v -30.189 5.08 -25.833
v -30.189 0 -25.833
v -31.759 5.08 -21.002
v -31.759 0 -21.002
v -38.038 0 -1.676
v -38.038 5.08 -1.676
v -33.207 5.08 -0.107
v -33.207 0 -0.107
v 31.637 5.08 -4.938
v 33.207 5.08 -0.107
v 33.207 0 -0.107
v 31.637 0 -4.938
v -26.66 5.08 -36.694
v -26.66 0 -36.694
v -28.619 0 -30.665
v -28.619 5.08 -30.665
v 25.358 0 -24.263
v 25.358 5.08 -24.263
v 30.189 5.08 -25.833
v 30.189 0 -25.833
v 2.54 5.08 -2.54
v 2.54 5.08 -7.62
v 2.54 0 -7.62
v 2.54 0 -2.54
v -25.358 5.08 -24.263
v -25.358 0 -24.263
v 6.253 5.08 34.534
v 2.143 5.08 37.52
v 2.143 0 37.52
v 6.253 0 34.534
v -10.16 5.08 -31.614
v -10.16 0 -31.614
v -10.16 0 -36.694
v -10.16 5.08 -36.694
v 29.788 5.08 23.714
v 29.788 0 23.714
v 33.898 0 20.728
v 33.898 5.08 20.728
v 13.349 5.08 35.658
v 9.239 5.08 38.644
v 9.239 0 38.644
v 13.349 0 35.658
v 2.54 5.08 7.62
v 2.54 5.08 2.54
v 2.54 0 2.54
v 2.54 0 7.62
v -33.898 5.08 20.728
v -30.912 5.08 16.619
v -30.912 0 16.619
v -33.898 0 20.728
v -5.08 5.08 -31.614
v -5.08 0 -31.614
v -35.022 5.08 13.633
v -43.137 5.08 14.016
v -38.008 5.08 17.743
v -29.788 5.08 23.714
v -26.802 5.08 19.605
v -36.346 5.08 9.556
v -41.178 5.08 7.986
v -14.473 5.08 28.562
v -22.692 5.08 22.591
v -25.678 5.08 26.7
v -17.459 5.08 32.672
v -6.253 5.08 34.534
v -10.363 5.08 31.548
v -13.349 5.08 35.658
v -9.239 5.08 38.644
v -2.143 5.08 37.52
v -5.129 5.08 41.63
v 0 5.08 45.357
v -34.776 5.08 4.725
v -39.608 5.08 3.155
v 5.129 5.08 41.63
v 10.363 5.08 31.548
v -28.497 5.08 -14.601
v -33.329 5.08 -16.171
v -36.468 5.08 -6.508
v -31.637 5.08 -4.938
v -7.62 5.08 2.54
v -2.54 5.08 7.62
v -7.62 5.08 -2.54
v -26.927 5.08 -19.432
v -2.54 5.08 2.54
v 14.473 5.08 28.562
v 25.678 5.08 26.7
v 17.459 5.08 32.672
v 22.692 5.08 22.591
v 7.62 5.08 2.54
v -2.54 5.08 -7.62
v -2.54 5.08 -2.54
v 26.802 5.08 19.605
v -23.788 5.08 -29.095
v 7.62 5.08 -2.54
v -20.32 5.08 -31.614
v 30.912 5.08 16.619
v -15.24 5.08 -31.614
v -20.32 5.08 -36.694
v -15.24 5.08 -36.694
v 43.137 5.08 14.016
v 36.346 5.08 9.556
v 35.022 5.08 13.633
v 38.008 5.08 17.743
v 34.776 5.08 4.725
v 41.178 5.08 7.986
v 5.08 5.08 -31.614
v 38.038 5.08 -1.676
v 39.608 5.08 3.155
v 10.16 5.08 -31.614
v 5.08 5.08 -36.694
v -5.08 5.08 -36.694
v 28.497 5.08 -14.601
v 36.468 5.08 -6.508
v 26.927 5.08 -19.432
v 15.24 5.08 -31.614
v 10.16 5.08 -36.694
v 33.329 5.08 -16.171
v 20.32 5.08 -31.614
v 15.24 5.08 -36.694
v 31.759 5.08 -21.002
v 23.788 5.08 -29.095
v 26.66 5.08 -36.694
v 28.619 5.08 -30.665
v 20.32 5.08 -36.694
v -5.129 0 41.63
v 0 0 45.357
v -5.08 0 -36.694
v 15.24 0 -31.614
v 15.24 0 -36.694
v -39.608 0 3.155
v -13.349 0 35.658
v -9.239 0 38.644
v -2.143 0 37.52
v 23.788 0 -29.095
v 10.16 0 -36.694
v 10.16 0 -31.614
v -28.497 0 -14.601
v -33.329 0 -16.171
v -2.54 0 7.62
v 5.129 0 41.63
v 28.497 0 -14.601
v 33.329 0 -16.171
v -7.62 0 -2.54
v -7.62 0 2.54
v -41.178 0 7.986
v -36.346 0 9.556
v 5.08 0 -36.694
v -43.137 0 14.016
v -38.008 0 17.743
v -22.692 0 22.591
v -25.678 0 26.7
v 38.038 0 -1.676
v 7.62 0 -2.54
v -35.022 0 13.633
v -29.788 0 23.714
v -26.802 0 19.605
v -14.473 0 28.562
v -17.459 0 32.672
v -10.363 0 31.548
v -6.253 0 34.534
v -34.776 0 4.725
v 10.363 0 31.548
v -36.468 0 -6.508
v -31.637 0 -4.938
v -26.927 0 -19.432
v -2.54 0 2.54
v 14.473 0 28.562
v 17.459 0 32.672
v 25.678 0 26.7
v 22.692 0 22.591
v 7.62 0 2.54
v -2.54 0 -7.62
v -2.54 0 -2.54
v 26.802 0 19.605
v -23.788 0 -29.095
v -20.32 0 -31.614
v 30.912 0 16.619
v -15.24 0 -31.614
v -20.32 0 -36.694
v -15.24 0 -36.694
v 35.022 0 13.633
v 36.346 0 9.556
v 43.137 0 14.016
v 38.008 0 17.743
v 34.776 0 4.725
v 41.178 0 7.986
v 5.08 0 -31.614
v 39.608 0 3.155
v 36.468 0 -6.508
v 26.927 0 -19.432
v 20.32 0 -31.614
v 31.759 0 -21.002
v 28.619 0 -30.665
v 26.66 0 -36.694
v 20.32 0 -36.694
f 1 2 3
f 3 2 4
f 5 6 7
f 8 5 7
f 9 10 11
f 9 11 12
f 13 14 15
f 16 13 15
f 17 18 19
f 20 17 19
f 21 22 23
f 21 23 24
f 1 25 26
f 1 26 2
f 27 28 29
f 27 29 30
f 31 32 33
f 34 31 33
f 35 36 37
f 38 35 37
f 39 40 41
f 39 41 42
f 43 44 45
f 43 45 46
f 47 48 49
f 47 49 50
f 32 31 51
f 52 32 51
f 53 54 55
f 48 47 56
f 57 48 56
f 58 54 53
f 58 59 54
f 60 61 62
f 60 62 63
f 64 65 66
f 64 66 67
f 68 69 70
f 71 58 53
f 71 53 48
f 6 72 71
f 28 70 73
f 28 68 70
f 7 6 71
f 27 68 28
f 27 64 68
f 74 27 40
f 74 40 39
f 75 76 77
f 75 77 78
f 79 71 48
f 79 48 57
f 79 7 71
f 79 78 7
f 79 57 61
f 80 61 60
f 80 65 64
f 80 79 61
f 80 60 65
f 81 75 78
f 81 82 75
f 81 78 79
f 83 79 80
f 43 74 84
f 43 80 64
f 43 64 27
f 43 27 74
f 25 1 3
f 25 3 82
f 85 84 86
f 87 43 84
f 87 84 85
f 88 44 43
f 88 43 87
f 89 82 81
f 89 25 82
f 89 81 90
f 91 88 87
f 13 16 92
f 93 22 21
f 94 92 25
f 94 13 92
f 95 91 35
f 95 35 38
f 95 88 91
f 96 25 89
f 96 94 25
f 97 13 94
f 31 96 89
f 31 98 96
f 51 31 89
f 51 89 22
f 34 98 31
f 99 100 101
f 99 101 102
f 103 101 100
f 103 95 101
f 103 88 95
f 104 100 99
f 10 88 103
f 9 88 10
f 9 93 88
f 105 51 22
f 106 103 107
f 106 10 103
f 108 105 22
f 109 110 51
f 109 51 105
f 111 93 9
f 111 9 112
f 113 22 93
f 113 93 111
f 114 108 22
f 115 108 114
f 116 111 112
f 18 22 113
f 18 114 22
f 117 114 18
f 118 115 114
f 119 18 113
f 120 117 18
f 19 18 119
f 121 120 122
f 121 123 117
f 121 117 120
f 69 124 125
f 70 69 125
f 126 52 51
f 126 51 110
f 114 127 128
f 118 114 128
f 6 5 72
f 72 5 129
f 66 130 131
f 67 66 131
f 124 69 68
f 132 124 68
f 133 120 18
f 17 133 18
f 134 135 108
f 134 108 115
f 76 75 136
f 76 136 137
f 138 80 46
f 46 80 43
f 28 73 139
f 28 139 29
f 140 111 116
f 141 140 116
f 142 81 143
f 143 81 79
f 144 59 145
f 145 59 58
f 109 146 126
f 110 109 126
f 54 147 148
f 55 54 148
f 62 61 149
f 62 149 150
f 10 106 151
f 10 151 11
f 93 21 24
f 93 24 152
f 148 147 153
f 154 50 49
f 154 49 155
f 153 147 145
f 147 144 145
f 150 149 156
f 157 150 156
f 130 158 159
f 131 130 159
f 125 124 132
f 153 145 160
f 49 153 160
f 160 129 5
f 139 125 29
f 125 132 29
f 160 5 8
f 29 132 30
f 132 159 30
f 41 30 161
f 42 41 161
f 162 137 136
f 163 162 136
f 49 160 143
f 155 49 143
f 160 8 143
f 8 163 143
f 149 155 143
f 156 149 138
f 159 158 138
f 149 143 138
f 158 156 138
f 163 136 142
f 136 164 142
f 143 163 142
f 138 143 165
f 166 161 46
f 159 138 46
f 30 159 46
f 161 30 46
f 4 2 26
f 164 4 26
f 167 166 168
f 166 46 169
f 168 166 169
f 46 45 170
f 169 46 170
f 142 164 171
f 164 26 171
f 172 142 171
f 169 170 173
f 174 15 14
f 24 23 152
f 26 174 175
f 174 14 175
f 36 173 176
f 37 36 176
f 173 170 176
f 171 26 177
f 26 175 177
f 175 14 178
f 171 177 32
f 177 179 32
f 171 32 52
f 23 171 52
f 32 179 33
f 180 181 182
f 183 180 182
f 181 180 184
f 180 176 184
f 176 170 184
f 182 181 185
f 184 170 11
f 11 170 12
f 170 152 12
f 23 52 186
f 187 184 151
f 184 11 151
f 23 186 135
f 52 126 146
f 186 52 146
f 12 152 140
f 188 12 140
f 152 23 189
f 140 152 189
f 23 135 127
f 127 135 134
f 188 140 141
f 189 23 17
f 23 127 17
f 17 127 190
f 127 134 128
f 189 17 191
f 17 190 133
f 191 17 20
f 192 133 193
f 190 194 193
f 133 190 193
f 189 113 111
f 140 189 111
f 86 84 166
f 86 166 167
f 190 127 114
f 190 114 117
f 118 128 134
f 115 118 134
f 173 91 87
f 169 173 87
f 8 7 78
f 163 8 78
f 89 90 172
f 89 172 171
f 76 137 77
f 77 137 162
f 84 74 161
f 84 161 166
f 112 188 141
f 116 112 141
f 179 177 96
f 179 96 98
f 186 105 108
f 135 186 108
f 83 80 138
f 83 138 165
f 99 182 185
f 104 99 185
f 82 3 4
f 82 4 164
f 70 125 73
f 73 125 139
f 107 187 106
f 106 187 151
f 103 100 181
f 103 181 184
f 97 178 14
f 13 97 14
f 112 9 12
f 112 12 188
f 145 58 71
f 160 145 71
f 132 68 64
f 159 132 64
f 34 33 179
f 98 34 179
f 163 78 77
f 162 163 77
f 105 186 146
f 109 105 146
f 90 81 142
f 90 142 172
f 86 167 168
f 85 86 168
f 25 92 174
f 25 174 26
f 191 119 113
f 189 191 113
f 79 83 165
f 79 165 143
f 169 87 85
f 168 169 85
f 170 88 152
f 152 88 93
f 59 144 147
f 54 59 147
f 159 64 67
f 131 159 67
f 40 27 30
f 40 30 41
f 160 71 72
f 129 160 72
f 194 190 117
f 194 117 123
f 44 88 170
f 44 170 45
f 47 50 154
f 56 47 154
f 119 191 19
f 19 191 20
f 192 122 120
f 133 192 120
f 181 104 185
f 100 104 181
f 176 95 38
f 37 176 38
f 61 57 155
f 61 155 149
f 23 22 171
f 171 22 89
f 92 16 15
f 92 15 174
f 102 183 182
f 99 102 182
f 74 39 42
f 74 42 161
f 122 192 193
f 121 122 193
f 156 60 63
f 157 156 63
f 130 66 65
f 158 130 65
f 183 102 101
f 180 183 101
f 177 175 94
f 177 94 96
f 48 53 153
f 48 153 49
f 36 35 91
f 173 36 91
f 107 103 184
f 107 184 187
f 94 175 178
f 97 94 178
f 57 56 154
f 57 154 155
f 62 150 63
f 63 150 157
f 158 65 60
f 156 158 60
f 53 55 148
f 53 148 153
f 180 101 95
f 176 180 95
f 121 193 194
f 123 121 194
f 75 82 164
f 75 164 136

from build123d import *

# Parameters (mm, degrees)
BOSS_EXTRUDE1_DEPTH = 5.08
SKETCH2_W           = 5.08
SKETCH2_H           = 5.08
CUT_EXTRUDE1_DEPTH  = 5.08
CUT_EXTRUDE2_DEPTH  = 5.08


with BuildPart() as part:
    # Sketch1 → Boss-Extrude1 (new body)
    with BuildSketch(Plane(origin=(0, 0, 0), x_dir=(1, 0, 0), z_dir=(0, 1, 0))):
        Polygon((0, -45.356701101), (43.13678614, -14.015991449), (26.66, 36.694342), (-26.66, 36.694342), (-43.13678614, -14.015991449), align=None)
    extrude(amount=BOSS_EXTRUDE1_DEPTH)

    # Sketch2 → Cut-Extrude1 (cut)
    with BuildSketch(Plane(origin=(0, 5.08, 0), x_dir=(1, 0, 0), z_dir=(0, 1, 0))):
        with Locations((-17.78, 34.154342)):
            Rectangle(SKETCH2_W, SKETCH2_H)
        with Locations((7.62, 34.154342)):
            Rectangle(SKETCH2_W, SKETCH2_H)
        with Locations((17.78, 34.154342)):
            Rectangle(SKETCH2_W, SKETCH2_H)
        with Locations((-7.62, 34.154342)):
            Rectangle(SKETCH2_W, SKETCH2_H)
        Polygon((28.619167744, 30.664643686), (23.787800642, 29.094837355), (25.357606973, 24.263470252), (30.188974076, 25.833276584), align=None)
        Polygon((36.468199401, 6.507808173), (38.038005733, 1.67644107), (33.20663863, 0.106634738), (31.636832299, 4.938001841), align=None)
        Polygon((39.607812064, -3.154926033), (41.177618396, -7.986293136), (36.346251293, -9.556099467), (34.776444962, -4.724732364), align=None)
        Polygon((31.758780407, 21.001909481), (26.927413304, 19.432103149), (28.497219636, 14.600736047), (33.328586739, 16.170542378), align=None)
        Polygon((38.007618396, -17.742549949), (35.021669314, -13.632743617), (30.911862983, -16.618692699), (33.897812064, -20.72849903), align=None)
        Polygon((17.458586739, -32.672295357), (13.348780407, -35.658244439), (10.362831326, -31.548438107), (14.472637657, -28.562489025), align=None)
        Polygon((9.238974076, -38.64419352), (5.129167744, -41.630142602), (2.143218663, -37.52033627), (6.253024994, -34.534387189), align=None)
        Polygon((29.788005733, -23.714448112), (26.802056651, -19.60464178), (22.69225032, -22.590590862), (25.678199401, -26.700397194), align=None)
        Polygon((-5.129167744, -41.630142602), (-2.143218663, -37.52033627), (-6.253024994, -34.534387189), (-9.238974076, -38.64419352), align=None)
        Polygon((-25.678199401, -26.700397194), (-29.788005733, -23.714448112), (-26.802056651, -19.60464178), (-22.69225032, -22.590590862), align=None)
        Polygon((-33.897812064, -20.72849903), (-38.007618396, -17.742549949), (-35.021669314, -13.632743617), (-30.911862983, -16.618692699), align=None)
        Polygon((-13.348780407, -35.658244439), (-10.362831326, -31.548438107), (-14.472637657, -28.562489025), (-17.458586739, -32.672295357), align=None)
        Polygon((-41.177618396, -7.986293136), (-36.346251293, -9.556099467), (-34.776444962, -4.724732364), (-39.607812064, -3.154926033), align=None)
        Polygon((-33.328586739, 16.170542378), (-31.758780407, 21.001909481), (-26.927413304, 19.432103149), (-28.497219636, 14.600736047), align=None)
        Polygon((-30.188974076, 25.833276584), (-28.619167744, 30.664643686), (-23.787800642, 29.094837355), (-25.357606973, 24.263470252), align=None)
        Polygon((-38.038005733, 1.67644107), (-33.20663863, 0.106634738), (-31.636832299, 4.938001841), (-36.468199401, 6.507808173), align=None)
    extrude(amount=-CUT_EXTRUDE1_DEPTH, mode=Mode.SUBTRACT)

    # Sketch3 → Cut-Extrude2 (cut)
    with BuildSketch(Plane(origin=(0, 5.08, 0), x_dir=(1, 0, 0), z_dir=(0, 1, 0))):
        Polygon((0, 7.62), (2.54, 7.62), (2.54, 2.54), (7.62, 2.54), (7.62, 0), (7.62, -2.54), (2.54, -2.54), (2.54, -7.62), (0, -7.62), (-2.54, -7.62), (-2.54, -2.54), (-7.62, -2.54), (-7.62, 0), (-7.62, 2.54), (-2.54, 2.54), (-2.54, 7.62), align=None)
    extrude(amount=-CUT_EXTRUDE2_DEPTH, mode=Mode.SUBTRACT)


solid = part.part
